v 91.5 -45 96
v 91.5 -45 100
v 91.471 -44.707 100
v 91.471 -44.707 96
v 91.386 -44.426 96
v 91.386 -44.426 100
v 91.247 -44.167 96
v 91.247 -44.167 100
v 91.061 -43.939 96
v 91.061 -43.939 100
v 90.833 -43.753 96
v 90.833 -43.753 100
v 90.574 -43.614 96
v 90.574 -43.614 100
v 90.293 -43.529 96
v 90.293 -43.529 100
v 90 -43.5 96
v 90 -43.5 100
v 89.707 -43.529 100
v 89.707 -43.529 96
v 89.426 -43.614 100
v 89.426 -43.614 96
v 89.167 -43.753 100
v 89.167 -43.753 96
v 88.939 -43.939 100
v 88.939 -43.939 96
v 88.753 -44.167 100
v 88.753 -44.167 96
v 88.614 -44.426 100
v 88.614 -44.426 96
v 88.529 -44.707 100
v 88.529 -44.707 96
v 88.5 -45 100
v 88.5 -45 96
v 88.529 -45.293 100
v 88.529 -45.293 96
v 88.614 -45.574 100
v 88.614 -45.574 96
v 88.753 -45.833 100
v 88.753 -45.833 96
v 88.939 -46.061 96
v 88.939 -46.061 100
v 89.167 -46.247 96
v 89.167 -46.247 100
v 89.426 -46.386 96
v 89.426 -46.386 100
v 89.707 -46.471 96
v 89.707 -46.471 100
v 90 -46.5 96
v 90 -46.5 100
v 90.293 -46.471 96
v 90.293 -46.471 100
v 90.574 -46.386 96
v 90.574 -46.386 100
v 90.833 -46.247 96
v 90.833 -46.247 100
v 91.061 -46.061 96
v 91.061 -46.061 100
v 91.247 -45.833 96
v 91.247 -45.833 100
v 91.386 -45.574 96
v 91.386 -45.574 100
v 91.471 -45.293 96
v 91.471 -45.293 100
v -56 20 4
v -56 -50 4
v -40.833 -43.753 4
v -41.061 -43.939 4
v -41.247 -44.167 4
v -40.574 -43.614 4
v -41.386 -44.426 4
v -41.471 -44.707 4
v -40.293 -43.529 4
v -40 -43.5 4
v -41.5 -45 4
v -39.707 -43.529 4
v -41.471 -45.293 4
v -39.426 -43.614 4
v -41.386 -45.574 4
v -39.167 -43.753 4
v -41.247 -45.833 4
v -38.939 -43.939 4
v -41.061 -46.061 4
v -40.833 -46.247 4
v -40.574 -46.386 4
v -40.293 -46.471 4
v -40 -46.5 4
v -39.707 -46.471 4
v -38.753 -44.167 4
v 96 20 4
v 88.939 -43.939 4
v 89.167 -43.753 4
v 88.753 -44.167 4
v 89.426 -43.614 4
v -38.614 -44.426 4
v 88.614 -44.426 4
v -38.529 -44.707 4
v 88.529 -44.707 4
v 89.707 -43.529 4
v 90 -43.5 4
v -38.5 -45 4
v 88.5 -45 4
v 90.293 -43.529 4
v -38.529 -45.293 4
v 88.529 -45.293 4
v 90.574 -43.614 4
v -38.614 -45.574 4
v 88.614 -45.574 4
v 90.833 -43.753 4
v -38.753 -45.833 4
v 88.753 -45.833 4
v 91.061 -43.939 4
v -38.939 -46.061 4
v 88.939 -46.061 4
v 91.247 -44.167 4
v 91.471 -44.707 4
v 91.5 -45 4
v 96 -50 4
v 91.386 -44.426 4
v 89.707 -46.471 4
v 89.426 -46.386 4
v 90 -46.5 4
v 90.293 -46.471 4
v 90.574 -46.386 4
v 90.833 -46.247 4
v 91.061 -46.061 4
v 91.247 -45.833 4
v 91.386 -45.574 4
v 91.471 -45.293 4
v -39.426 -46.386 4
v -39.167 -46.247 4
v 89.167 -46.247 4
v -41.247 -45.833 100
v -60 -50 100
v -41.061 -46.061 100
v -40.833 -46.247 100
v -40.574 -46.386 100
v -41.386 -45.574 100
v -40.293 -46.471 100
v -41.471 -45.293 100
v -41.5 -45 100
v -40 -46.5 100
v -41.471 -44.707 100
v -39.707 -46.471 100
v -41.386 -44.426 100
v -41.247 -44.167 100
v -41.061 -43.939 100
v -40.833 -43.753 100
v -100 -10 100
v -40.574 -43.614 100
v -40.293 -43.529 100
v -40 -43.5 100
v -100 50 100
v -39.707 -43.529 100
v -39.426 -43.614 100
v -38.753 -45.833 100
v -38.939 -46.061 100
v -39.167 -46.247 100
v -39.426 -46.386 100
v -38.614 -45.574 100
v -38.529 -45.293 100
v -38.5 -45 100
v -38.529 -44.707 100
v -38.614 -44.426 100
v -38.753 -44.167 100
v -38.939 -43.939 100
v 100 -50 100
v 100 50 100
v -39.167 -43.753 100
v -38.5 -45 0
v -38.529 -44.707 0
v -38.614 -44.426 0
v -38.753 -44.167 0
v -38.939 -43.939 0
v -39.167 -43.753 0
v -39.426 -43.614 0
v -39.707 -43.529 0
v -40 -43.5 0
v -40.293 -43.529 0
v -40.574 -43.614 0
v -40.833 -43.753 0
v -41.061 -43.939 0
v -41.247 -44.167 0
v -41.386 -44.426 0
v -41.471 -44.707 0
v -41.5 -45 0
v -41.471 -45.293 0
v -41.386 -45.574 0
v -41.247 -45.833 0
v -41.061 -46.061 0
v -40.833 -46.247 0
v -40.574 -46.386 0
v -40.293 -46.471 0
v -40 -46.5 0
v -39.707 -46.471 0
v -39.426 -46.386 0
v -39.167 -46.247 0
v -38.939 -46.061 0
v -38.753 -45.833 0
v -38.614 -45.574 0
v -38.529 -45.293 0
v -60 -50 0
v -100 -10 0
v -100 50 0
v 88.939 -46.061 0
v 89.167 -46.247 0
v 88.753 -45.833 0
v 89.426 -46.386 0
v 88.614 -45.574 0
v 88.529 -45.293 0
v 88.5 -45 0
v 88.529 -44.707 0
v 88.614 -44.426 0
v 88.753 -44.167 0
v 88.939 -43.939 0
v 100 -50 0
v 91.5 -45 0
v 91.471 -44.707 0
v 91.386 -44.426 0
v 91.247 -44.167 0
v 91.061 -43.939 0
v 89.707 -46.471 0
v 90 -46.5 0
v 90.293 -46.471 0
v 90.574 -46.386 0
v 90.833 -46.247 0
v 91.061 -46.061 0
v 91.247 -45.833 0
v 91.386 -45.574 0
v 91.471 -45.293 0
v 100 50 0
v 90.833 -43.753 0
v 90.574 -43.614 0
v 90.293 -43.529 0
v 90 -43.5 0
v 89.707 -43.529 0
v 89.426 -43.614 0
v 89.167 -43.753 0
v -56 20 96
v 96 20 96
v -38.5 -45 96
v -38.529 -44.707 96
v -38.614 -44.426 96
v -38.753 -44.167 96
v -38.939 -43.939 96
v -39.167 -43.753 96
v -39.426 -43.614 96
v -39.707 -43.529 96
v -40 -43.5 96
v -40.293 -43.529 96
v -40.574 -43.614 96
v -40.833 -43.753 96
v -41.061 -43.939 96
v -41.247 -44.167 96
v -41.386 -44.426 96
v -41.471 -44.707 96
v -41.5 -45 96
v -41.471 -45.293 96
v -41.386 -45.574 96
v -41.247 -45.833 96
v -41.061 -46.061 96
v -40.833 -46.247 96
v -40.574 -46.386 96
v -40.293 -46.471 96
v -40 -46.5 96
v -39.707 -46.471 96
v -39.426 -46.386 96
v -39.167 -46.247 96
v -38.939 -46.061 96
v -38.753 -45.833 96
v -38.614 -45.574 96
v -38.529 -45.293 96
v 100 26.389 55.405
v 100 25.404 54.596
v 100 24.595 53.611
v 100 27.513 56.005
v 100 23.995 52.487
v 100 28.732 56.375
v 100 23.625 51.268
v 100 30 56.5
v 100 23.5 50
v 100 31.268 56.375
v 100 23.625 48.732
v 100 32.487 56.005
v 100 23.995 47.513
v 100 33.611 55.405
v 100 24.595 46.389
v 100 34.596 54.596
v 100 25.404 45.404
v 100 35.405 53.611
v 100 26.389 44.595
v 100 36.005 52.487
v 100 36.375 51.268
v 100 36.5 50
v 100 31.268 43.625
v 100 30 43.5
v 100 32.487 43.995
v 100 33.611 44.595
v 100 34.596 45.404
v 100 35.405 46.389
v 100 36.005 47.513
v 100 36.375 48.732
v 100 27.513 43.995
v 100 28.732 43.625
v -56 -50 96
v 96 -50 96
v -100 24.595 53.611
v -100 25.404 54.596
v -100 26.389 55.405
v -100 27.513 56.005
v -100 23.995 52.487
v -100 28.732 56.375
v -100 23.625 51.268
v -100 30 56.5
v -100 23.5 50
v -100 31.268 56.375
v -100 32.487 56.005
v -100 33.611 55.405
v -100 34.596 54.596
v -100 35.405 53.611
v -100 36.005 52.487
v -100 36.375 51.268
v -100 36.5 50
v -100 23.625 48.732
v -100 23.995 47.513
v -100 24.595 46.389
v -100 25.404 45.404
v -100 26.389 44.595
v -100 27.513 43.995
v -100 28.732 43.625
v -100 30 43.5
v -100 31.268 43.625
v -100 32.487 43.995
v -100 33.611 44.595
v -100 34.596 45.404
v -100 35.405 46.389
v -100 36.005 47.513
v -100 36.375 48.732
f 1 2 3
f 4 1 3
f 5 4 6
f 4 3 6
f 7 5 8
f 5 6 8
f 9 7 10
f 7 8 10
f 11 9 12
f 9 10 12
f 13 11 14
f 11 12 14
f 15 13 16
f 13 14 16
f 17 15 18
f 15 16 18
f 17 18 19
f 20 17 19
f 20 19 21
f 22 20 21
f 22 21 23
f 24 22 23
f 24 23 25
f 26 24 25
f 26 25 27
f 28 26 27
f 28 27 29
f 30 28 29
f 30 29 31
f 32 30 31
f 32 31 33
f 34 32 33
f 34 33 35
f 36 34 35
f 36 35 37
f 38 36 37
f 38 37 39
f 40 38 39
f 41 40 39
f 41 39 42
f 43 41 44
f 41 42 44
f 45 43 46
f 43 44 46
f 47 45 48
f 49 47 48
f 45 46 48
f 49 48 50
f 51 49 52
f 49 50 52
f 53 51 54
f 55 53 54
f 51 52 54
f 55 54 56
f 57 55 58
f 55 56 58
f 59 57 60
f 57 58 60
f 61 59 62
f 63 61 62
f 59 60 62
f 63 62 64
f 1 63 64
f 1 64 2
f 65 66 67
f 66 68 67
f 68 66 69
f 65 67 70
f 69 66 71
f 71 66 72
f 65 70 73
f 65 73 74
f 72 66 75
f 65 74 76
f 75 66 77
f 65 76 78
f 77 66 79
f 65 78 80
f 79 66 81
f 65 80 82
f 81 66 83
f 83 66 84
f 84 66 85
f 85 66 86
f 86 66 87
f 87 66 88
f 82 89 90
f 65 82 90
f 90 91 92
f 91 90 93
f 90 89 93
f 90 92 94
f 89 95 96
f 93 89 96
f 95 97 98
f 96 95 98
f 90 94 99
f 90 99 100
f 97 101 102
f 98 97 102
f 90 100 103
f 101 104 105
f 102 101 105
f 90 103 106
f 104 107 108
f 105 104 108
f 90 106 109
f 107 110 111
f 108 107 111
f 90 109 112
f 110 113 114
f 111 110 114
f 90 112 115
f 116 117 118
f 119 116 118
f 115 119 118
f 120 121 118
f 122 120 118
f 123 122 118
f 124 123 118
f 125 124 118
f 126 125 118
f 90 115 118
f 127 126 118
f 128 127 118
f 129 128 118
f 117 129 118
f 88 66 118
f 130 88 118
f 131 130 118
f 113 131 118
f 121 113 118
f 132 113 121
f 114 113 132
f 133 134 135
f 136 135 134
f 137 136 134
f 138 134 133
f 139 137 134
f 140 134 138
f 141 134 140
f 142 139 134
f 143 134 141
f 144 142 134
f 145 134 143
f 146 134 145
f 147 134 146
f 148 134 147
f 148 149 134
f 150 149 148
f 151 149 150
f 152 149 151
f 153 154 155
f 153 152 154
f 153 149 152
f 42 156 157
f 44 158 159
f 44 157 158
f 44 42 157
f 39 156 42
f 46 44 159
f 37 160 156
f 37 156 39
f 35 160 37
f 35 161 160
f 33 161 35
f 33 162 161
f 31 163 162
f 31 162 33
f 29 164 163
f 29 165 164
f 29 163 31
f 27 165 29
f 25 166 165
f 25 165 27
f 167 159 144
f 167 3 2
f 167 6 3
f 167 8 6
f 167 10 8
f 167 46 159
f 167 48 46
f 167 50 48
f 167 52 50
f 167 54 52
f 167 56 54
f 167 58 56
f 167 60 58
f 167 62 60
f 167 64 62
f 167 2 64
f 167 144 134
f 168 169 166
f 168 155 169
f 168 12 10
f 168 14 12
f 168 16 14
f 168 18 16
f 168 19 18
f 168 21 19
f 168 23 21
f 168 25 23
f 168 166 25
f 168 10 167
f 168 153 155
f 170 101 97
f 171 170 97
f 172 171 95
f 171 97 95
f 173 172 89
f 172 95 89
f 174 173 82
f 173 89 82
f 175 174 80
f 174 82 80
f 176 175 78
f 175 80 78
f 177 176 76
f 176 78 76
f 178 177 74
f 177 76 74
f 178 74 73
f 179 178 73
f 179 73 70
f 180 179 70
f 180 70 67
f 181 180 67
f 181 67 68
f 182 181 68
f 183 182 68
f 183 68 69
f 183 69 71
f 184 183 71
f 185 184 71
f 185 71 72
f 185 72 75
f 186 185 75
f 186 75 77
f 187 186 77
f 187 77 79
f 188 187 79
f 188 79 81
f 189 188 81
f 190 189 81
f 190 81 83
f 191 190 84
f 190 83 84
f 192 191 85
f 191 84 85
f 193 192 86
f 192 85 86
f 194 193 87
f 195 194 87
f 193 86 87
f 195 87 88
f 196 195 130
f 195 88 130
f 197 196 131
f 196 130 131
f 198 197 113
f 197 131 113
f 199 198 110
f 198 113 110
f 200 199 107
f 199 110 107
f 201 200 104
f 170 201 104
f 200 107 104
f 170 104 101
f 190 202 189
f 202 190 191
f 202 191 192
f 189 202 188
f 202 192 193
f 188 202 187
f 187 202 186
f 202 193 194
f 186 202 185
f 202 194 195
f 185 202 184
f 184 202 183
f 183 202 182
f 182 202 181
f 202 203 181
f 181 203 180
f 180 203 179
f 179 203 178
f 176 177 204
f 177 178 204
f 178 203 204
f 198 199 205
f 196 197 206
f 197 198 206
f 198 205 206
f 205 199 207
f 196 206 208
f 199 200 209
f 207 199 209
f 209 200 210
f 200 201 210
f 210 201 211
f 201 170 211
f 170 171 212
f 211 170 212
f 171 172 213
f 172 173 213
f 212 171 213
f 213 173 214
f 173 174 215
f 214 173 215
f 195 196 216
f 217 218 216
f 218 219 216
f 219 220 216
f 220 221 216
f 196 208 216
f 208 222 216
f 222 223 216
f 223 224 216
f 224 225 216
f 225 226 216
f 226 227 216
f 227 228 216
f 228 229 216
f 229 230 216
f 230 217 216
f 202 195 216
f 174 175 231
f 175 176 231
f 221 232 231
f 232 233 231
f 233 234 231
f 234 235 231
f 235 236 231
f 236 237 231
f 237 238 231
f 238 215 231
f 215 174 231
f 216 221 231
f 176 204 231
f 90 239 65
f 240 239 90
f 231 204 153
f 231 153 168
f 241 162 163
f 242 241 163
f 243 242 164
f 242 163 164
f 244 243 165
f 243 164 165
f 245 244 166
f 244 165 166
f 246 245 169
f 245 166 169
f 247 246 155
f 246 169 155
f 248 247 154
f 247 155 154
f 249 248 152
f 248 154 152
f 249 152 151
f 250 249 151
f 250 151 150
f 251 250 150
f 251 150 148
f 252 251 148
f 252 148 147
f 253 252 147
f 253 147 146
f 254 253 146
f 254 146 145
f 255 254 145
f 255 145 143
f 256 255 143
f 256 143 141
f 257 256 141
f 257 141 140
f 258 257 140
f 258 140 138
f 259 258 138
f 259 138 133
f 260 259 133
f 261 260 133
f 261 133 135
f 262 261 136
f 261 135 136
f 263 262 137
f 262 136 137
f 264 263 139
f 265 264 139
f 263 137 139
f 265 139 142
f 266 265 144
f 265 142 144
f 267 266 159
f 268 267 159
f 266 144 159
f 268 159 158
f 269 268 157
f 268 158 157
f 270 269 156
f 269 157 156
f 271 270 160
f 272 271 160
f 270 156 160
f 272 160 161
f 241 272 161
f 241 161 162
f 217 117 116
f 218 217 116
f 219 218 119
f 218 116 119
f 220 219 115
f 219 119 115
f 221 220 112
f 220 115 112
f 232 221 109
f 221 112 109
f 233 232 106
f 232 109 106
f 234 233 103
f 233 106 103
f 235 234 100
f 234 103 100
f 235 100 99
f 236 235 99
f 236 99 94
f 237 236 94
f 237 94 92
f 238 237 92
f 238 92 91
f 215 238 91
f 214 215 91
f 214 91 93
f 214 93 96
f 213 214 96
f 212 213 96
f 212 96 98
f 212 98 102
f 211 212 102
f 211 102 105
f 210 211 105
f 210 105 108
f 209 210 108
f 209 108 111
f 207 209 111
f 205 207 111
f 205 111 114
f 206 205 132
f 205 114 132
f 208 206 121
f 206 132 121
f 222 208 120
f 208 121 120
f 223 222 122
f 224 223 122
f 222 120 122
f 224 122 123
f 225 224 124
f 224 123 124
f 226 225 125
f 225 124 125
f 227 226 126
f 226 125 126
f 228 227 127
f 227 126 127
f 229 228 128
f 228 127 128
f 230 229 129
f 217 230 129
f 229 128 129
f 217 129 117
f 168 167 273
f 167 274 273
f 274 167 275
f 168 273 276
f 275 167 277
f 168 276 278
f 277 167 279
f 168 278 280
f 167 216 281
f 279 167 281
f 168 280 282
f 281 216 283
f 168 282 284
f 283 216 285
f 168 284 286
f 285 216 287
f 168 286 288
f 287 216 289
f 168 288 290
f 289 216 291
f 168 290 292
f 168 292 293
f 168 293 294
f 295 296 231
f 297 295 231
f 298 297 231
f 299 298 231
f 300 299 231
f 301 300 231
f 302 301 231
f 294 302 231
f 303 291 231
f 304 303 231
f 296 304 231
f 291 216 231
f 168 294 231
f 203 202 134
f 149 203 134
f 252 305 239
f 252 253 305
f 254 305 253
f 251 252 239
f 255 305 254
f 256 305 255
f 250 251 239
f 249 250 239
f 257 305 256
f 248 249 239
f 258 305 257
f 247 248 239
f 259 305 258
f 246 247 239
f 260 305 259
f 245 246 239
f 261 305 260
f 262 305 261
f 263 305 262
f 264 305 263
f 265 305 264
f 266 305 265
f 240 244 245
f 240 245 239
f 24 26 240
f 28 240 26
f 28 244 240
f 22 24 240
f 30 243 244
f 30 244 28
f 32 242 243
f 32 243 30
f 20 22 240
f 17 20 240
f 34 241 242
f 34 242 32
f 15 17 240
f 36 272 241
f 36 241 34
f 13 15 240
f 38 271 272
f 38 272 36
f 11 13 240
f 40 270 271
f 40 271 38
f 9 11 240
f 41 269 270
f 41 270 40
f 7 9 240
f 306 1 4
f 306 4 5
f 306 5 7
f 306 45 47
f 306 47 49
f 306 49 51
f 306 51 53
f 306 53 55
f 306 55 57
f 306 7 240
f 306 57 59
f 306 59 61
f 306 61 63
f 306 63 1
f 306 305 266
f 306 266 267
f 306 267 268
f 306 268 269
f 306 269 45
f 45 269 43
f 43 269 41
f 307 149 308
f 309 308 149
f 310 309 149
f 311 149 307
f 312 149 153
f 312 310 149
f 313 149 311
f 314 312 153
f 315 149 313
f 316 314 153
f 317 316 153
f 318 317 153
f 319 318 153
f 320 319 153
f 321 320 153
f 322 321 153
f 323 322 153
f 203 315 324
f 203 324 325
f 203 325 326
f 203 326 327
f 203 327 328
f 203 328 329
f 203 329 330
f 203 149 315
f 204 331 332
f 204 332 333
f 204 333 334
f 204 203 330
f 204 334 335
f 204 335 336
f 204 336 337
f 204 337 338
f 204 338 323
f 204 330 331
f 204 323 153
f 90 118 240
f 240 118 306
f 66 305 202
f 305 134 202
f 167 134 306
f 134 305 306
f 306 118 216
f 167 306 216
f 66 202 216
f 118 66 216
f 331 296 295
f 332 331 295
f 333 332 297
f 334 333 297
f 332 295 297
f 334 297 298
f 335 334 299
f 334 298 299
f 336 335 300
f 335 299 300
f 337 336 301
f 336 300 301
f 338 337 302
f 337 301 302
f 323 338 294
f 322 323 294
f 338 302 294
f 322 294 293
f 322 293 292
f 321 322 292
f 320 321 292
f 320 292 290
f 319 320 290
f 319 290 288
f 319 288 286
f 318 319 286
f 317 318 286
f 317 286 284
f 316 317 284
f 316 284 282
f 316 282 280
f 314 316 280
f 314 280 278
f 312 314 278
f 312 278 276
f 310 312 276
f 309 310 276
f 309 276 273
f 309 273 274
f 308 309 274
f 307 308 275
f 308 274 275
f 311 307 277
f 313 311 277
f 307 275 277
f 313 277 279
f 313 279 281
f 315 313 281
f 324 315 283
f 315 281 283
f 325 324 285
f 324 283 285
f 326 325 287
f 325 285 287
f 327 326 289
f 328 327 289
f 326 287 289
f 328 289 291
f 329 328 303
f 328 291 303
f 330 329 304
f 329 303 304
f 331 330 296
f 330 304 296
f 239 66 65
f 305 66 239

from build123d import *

# Parameters (mm, degrees)
ESQUISSE1_W             = 200
ESQUISSE1_H             = 100
BOSS_EXTRU_1_DEPTH      = 100
CHANFREIN1_SIZE         = 40
ESQUISSE2_R             = 6.5
ENL_V_MAT_EXTRU_1_DEPTH = 230.128784748
ESQUISSE4_R             = 1.5
ENL_V_MAT_EXTRU_3_DEPTH = 151
ESQUISSE5_W             = 152
ESQUISSE5_H             = 92
ENL_V_MAT_EXTRU_4_DEPTH = 70


with BuildPart() as part:
    # Esquisse1 → Boss.-Extru.1 (new body)
    with BuildSketch(Plane.XY):
        Rectangle(ESQUISSE1_W, ESQUISSE1_H)
    extrude(amount=BOSS_EXTRU_1_DEPTH)

    # Chanfrein1
    chanfrein1_edges = [part.edges().sort_by_distance(p)[0] for p in [
        (-100, -50, 50),
    ]]
    chamfer(chanfrein1_edges, length=CHANFREIN1_SIZE)

    # Esquisse2 → Enlèv. mat.-Extru.1 (cut, through all)
    with BuildSketch(Plane(origin=(100, 0, 0), x_dir=(0, 0, -1), z_dir=(1, 0, 0))):
        with Locations((-50, 30)):
            Circle(ESQUISSE2_R)
    extrude(amount=-ENL_V_MAT_EXTRU_1_DEPTH, mode=Mode.SUBTRACT)

    # Esquisse4 → Enlèv. mat.-Extru.3 (cut, through all)
    with BuildSketch(Plane.XY.offset(100)):
        with Locations((90, -45)):
            Circle(ESQUISSE4_R)
        with Locations((-40, -45)):
            Circle(ESQUISSE4_R)
    extrude(amount=-ENL_V_MAT_EXTRU_3_DEPTH, mode=Mode.SUBTRACT)

    # Esquisse5 → Enlèv. mat.-Extru.4 (cut)
    with BuildSketch(Plane.XZ.offset(50)):
        with Locations((20, 50)):
            Rectangle(ESQUISSE5_W, ESQUISSE5_H)
    extrude(amount=-ENL_V_MAT_EXTRU_4_DEPTH, mode=Mode.SUBTRACT)


solid = part.part
